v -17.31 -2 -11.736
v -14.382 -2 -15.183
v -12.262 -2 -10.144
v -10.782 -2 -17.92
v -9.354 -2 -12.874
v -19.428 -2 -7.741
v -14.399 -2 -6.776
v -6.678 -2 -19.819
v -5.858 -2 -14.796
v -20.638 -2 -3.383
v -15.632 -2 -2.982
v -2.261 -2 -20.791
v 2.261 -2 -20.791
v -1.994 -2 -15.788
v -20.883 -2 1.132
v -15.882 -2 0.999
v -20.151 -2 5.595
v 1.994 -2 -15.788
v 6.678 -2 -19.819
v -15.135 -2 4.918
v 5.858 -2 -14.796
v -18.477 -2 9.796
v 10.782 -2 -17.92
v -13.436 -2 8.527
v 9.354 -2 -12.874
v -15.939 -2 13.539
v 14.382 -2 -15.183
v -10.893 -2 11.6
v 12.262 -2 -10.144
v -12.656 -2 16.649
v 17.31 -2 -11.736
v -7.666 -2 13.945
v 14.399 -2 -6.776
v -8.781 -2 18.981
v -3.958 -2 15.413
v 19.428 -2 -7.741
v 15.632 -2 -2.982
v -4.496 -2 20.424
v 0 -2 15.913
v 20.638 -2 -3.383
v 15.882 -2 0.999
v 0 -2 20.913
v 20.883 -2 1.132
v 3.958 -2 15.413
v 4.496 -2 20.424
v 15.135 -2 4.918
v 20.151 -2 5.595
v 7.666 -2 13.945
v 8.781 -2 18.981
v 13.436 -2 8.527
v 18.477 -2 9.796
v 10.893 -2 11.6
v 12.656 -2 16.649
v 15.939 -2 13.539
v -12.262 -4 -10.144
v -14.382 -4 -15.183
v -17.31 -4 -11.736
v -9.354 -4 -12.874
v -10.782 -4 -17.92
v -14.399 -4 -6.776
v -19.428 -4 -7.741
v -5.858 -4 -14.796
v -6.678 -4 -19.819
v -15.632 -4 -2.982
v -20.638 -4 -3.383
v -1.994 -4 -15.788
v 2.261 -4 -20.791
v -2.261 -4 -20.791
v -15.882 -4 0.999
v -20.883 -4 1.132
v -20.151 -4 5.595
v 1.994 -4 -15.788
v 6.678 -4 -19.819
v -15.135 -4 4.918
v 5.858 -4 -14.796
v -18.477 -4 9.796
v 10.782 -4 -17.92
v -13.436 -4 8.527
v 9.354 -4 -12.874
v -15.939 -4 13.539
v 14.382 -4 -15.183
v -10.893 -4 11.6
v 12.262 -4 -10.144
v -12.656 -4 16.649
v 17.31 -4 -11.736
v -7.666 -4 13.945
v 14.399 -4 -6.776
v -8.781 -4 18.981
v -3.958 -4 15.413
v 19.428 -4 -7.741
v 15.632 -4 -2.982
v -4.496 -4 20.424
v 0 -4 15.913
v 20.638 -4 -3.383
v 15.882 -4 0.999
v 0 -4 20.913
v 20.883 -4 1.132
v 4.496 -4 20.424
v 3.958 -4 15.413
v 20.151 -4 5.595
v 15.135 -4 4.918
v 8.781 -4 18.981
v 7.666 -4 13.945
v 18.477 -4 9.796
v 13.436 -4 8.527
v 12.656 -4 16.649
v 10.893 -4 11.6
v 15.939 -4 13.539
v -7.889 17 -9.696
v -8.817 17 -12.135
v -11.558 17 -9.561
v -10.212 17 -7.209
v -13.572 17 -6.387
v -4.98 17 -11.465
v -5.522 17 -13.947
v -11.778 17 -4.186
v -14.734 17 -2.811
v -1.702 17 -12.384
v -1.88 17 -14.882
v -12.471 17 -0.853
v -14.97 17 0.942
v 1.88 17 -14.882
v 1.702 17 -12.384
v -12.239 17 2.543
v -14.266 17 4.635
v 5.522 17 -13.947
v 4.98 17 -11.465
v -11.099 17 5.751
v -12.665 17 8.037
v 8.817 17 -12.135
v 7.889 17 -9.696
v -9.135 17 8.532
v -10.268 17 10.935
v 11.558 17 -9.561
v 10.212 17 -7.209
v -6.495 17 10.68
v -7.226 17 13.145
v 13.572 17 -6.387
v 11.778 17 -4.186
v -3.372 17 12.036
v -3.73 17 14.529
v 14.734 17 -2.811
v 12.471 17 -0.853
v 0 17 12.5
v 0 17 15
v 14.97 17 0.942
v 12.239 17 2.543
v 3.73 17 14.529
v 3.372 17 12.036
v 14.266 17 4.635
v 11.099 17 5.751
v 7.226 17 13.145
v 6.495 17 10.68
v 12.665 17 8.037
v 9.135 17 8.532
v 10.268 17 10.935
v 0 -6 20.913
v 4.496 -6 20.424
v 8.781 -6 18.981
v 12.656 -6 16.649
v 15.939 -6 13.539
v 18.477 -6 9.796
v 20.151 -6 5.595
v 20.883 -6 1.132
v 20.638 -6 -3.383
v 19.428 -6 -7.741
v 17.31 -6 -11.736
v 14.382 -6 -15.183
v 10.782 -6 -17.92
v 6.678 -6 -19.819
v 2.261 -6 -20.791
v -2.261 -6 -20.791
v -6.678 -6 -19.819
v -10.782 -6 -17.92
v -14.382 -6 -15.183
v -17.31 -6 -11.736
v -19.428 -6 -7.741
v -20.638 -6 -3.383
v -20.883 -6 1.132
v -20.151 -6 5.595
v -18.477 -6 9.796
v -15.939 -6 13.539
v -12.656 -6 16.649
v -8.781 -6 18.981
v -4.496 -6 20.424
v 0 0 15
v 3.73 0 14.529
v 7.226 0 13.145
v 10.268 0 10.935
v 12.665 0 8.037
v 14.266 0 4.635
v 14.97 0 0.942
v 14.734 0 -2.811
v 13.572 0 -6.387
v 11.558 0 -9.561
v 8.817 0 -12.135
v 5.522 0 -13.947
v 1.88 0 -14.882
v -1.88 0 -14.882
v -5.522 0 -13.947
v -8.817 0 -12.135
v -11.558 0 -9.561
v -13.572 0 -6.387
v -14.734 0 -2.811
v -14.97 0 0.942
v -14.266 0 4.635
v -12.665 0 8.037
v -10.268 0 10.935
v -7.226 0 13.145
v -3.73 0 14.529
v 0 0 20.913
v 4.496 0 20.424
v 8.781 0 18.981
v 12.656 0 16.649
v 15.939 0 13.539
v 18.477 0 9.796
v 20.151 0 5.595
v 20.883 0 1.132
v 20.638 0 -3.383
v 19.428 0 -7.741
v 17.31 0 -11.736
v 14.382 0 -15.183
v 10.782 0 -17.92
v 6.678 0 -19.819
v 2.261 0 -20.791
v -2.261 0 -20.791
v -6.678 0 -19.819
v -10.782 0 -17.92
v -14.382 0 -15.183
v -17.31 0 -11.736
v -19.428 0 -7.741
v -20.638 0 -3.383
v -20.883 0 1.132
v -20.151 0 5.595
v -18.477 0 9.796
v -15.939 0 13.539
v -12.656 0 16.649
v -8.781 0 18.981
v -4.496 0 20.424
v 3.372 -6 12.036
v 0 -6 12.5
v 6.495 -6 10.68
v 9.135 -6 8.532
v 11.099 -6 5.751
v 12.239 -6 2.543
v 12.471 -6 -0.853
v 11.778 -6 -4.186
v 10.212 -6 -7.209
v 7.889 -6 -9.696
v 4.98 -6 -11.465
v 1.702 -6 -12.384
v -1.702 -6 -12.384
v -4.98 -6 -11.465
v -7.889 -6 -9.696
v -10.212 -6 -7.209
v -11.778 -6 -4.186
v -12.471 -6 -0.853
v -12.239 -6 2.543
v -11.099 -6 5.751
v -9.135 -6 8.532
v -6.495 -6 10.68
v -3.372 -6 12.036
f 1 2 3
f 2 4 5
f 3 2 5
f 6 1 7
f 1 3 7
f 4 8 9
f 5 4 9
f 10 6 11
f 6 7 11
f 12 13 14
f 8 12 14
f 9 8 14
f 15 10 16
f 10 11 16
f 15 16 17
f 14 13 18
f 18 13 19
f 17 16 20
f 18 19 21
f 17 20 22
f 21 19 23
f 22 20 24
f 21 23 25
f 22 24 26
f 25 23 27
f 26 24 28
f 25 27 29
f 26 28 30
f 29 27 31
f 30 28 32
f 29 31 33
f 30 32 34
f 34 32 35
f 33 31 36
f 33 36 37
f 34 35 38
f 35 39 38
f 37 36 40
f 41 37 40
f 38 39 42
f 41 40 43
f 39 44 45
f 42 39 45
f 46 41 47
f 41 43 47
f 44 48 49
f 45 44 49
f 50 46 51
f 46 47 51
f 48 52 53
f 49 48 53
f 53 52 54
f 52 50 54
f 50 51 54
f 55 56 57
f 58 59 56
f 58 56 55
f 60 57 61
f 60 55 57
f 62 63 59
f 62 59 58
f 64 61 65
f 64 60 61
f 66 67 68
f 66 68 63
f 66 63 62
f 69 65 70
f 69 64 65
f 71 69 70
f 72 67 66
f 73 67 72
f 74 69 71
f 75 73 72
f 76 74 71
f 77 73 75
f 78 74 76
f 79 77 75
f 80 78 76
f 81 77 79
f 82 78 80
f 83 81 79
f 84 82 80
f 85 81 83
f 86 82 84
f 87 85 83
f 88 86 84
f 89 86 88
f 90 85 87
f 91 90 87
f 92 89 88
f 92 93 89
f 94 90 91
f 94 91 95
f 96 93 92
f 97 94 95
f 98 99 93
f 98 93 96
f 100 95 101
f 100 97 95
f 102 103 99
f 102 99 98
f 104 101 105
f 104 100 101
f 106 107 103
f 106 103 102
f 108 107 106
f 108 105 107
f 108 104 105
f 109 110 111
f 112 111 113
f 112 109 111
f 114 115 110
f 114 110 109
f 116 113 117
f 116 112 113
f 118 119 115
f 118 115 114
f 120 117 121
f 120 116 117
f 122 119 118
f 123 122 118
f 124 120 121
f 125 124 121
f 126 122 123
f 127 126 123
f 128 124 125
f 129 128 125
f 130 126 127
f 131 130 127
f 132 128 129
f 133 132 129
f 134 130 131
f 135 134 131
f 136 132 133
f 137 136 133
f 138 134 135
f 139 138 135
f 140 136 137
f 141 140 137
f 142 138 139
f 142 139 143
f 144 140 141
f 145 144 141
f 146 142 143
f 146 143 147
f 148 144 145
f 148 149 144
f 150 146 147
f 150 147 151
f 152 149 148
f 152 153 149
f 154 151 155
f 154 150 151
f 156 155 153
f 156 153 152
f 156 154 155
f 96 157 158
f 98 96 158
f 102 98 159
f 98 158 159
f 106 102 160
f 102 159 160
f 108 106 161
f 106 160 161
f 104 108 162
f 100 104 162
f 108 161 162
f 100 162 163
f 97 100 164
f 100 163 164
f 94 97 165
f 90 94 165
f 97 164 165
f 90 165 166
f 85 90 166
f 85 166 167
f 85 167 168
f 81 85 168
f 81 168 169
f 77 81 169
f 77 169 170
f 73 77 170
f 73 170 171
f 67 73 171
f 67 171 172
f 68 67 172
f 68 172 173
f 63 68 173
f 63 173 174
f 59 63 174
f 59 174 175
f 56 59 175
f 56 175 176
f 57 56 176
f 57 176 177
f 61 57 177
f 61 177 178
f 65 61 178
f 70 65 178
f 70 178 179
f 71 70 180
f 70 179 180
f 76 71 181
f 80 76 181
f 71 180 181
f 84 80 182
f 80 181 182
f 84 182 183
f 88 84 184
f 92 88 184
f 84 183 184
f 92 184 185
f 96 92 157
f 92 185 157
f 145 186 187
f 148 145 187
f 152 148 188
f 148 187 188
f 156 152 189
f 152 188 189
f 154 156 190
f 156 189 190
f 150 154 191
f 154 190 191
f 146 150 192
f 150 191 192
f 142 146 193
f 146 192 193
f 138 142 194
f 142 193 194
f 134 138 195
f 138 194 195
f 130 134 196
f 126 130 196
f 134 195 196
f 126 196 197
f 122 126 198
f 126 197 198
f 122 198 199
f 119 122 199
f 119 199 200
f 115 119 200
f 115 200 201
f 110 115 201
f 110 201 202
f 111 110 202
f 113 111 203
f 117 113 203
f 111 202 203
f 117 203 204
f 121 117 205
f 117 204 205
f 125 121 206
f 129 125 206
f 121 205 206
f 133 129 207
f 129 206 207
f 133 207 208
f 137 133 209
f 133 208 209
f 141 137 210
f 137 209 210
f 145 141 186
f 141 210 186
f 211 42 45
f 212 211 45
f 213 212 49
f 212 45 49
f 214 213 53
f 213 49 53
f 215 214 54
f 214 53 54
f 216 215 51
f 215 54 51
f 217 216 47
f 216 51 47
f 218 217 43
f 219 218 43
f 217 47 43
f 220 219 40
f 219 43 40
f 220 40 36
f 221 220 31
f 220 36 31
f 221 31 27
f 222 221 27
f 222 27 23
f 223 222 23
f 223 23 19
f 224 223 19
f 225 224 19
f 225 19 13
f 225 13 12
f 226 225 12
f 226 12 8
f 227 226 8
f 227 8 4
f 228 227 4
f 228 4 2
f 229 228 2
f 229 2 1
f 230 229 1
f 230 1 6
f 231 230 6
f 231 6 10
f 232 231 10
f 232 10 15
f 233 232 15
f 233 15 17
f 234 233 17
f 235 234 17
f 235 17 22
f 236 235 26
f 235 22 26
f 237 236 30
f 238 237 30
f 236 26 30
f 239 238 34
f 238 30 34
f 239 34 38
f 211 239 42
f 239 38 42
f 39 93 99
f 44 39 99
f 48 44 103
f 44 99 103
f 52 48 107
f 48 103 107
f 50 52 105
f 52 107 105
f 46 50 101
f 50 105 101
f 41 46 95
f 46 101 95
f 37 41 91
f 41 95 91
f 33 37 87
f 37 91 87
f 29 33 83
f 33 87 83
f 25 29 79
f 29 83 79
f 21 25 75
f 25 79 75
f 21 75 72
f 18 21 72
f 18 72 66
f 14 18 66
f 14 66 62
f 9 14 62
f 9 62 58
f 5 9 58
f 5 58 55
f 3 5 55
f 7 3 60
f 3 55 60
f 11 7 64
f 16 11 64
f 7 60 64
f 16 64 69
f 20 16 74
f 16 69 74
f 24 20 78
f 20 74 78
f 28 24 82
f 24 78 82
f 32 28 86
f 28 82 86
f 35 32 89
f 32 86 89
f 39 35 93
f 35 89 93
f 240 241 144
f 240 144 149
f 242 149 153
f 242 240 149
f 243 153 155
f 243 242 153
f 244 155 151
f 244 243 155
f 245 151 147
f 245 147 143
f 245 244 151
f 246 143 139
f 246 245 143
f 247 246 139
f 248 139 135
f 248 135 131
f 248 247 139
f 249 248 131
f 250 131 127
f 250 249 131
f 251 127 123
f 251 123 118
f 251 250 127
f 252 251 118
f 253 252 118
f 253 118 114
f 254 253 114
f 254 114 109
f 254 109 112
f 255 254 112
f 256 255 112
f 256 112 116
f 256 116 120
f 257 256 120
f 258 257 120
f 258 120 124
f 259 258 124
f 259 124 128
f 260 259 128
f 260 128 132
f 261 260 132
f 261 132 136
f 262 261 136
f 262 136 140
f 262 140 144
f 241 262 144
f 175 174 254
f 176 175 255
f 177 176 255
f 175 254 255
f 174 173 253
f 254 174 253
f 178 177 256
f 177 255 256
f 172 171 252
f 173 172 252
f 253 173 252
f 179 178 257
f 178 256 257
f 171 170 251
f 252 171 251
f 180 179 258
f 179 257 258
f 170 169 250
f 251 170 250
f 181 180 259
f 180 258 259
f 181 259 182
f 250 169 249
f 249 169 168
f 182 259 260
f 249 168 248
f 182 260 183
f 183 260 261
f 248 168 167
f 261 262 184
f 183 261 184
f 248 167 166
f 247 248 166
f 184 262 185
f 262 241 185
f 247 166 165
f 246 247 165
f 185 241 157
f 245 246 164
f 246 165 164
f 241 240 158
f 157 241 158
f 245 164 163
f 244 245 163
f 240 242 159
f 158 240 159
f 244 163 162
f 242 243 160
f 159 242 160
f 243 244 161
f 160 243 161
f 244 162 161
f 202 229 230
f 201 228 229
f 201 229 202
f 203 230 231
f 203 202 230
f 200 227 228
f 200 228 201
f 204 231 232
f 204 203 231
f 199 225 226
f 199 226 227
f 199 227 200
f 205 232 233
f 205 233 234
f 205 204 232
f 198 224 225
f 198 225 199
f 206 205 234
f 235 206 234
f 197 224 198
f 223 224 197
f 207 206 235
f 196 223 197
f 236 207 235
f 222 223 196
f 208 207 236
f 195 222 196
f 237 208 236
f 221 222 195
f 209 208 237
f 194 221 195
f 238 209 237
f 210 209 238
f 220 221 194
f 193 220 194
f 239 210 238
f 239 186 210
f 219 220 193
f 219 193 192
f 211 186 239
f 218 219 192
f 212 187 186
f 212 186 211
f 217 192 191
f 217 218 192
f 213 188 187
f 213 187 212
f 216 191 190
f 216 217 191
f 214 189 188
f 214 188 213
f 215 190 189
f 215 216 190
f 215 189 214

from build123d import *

# Parameters (mm, degrees)
SKETCH1_R           = 15
SKETCH1_R_2         = 12.5
BOSS_EXTRUDE1_DEPTH = 17
BOSS_EXTRUDE2_START = -6
SKETCH1_3_R         = 20.913430936
SKETCH1_3_R_2       = 12.5
BOSS_EXTRUDE2_DEPTH = 6
CUT_EXTRUDE1_START  = -4
SKETCH1_4_R         = 20.913430936
SKETCH1_4_R_2       = 15.913430936
CUT_EXTRUDE1_DEPTH  = 2


with BuildPart() as part:
    # Sketch1 → Boss-Extrude1 (new body)
    with BuildSketch(Plane(origin=(0, 0, 0), x_dir=(1, 0, 0), z_dir=(0, 1, 0))):
        Circle(SKETCH1_R)
        Circle(SKETCH1_R_2, mode=Mode.SUBTRACT)
    extrude(amount=BOSS_EXTRUDE1_DEPTH)

    # Sketch1<3> → Boss-Extrude2 (add)
    with BuildSketch(Plane(origin=(0, 0, 0), x_dir=(1, 0, 0), z_dir=(0, 1, 0)).offset(BOSS_EXTRUDE2_START)):
        Circle(SKETCH1_3_R)
        Circle(SKETCH1_3_R_2, mode=Mode.SUBTRACT)
    extrude(amount=BOSS_EXTRUDE2_DEPTH)

    # Sketch1<4> → Cut-Extrude1 (cut)
    with BuildSketch(Plane(origin=(0, 0, 0), x_dir=(1, 0, 0), z_dir=(0, 1, 0)).offset(CUT_EXTRUDE1_START)):
        Circle(SKETCH1_4_R)
        Circle(SKETCH1_4_R_2, mode=Mode.SUBTRACT)
    extrude(amount=CUT_EXTRUDE1_DEPTH, mode=Mode.SUBTRACT)


solid = part.part
